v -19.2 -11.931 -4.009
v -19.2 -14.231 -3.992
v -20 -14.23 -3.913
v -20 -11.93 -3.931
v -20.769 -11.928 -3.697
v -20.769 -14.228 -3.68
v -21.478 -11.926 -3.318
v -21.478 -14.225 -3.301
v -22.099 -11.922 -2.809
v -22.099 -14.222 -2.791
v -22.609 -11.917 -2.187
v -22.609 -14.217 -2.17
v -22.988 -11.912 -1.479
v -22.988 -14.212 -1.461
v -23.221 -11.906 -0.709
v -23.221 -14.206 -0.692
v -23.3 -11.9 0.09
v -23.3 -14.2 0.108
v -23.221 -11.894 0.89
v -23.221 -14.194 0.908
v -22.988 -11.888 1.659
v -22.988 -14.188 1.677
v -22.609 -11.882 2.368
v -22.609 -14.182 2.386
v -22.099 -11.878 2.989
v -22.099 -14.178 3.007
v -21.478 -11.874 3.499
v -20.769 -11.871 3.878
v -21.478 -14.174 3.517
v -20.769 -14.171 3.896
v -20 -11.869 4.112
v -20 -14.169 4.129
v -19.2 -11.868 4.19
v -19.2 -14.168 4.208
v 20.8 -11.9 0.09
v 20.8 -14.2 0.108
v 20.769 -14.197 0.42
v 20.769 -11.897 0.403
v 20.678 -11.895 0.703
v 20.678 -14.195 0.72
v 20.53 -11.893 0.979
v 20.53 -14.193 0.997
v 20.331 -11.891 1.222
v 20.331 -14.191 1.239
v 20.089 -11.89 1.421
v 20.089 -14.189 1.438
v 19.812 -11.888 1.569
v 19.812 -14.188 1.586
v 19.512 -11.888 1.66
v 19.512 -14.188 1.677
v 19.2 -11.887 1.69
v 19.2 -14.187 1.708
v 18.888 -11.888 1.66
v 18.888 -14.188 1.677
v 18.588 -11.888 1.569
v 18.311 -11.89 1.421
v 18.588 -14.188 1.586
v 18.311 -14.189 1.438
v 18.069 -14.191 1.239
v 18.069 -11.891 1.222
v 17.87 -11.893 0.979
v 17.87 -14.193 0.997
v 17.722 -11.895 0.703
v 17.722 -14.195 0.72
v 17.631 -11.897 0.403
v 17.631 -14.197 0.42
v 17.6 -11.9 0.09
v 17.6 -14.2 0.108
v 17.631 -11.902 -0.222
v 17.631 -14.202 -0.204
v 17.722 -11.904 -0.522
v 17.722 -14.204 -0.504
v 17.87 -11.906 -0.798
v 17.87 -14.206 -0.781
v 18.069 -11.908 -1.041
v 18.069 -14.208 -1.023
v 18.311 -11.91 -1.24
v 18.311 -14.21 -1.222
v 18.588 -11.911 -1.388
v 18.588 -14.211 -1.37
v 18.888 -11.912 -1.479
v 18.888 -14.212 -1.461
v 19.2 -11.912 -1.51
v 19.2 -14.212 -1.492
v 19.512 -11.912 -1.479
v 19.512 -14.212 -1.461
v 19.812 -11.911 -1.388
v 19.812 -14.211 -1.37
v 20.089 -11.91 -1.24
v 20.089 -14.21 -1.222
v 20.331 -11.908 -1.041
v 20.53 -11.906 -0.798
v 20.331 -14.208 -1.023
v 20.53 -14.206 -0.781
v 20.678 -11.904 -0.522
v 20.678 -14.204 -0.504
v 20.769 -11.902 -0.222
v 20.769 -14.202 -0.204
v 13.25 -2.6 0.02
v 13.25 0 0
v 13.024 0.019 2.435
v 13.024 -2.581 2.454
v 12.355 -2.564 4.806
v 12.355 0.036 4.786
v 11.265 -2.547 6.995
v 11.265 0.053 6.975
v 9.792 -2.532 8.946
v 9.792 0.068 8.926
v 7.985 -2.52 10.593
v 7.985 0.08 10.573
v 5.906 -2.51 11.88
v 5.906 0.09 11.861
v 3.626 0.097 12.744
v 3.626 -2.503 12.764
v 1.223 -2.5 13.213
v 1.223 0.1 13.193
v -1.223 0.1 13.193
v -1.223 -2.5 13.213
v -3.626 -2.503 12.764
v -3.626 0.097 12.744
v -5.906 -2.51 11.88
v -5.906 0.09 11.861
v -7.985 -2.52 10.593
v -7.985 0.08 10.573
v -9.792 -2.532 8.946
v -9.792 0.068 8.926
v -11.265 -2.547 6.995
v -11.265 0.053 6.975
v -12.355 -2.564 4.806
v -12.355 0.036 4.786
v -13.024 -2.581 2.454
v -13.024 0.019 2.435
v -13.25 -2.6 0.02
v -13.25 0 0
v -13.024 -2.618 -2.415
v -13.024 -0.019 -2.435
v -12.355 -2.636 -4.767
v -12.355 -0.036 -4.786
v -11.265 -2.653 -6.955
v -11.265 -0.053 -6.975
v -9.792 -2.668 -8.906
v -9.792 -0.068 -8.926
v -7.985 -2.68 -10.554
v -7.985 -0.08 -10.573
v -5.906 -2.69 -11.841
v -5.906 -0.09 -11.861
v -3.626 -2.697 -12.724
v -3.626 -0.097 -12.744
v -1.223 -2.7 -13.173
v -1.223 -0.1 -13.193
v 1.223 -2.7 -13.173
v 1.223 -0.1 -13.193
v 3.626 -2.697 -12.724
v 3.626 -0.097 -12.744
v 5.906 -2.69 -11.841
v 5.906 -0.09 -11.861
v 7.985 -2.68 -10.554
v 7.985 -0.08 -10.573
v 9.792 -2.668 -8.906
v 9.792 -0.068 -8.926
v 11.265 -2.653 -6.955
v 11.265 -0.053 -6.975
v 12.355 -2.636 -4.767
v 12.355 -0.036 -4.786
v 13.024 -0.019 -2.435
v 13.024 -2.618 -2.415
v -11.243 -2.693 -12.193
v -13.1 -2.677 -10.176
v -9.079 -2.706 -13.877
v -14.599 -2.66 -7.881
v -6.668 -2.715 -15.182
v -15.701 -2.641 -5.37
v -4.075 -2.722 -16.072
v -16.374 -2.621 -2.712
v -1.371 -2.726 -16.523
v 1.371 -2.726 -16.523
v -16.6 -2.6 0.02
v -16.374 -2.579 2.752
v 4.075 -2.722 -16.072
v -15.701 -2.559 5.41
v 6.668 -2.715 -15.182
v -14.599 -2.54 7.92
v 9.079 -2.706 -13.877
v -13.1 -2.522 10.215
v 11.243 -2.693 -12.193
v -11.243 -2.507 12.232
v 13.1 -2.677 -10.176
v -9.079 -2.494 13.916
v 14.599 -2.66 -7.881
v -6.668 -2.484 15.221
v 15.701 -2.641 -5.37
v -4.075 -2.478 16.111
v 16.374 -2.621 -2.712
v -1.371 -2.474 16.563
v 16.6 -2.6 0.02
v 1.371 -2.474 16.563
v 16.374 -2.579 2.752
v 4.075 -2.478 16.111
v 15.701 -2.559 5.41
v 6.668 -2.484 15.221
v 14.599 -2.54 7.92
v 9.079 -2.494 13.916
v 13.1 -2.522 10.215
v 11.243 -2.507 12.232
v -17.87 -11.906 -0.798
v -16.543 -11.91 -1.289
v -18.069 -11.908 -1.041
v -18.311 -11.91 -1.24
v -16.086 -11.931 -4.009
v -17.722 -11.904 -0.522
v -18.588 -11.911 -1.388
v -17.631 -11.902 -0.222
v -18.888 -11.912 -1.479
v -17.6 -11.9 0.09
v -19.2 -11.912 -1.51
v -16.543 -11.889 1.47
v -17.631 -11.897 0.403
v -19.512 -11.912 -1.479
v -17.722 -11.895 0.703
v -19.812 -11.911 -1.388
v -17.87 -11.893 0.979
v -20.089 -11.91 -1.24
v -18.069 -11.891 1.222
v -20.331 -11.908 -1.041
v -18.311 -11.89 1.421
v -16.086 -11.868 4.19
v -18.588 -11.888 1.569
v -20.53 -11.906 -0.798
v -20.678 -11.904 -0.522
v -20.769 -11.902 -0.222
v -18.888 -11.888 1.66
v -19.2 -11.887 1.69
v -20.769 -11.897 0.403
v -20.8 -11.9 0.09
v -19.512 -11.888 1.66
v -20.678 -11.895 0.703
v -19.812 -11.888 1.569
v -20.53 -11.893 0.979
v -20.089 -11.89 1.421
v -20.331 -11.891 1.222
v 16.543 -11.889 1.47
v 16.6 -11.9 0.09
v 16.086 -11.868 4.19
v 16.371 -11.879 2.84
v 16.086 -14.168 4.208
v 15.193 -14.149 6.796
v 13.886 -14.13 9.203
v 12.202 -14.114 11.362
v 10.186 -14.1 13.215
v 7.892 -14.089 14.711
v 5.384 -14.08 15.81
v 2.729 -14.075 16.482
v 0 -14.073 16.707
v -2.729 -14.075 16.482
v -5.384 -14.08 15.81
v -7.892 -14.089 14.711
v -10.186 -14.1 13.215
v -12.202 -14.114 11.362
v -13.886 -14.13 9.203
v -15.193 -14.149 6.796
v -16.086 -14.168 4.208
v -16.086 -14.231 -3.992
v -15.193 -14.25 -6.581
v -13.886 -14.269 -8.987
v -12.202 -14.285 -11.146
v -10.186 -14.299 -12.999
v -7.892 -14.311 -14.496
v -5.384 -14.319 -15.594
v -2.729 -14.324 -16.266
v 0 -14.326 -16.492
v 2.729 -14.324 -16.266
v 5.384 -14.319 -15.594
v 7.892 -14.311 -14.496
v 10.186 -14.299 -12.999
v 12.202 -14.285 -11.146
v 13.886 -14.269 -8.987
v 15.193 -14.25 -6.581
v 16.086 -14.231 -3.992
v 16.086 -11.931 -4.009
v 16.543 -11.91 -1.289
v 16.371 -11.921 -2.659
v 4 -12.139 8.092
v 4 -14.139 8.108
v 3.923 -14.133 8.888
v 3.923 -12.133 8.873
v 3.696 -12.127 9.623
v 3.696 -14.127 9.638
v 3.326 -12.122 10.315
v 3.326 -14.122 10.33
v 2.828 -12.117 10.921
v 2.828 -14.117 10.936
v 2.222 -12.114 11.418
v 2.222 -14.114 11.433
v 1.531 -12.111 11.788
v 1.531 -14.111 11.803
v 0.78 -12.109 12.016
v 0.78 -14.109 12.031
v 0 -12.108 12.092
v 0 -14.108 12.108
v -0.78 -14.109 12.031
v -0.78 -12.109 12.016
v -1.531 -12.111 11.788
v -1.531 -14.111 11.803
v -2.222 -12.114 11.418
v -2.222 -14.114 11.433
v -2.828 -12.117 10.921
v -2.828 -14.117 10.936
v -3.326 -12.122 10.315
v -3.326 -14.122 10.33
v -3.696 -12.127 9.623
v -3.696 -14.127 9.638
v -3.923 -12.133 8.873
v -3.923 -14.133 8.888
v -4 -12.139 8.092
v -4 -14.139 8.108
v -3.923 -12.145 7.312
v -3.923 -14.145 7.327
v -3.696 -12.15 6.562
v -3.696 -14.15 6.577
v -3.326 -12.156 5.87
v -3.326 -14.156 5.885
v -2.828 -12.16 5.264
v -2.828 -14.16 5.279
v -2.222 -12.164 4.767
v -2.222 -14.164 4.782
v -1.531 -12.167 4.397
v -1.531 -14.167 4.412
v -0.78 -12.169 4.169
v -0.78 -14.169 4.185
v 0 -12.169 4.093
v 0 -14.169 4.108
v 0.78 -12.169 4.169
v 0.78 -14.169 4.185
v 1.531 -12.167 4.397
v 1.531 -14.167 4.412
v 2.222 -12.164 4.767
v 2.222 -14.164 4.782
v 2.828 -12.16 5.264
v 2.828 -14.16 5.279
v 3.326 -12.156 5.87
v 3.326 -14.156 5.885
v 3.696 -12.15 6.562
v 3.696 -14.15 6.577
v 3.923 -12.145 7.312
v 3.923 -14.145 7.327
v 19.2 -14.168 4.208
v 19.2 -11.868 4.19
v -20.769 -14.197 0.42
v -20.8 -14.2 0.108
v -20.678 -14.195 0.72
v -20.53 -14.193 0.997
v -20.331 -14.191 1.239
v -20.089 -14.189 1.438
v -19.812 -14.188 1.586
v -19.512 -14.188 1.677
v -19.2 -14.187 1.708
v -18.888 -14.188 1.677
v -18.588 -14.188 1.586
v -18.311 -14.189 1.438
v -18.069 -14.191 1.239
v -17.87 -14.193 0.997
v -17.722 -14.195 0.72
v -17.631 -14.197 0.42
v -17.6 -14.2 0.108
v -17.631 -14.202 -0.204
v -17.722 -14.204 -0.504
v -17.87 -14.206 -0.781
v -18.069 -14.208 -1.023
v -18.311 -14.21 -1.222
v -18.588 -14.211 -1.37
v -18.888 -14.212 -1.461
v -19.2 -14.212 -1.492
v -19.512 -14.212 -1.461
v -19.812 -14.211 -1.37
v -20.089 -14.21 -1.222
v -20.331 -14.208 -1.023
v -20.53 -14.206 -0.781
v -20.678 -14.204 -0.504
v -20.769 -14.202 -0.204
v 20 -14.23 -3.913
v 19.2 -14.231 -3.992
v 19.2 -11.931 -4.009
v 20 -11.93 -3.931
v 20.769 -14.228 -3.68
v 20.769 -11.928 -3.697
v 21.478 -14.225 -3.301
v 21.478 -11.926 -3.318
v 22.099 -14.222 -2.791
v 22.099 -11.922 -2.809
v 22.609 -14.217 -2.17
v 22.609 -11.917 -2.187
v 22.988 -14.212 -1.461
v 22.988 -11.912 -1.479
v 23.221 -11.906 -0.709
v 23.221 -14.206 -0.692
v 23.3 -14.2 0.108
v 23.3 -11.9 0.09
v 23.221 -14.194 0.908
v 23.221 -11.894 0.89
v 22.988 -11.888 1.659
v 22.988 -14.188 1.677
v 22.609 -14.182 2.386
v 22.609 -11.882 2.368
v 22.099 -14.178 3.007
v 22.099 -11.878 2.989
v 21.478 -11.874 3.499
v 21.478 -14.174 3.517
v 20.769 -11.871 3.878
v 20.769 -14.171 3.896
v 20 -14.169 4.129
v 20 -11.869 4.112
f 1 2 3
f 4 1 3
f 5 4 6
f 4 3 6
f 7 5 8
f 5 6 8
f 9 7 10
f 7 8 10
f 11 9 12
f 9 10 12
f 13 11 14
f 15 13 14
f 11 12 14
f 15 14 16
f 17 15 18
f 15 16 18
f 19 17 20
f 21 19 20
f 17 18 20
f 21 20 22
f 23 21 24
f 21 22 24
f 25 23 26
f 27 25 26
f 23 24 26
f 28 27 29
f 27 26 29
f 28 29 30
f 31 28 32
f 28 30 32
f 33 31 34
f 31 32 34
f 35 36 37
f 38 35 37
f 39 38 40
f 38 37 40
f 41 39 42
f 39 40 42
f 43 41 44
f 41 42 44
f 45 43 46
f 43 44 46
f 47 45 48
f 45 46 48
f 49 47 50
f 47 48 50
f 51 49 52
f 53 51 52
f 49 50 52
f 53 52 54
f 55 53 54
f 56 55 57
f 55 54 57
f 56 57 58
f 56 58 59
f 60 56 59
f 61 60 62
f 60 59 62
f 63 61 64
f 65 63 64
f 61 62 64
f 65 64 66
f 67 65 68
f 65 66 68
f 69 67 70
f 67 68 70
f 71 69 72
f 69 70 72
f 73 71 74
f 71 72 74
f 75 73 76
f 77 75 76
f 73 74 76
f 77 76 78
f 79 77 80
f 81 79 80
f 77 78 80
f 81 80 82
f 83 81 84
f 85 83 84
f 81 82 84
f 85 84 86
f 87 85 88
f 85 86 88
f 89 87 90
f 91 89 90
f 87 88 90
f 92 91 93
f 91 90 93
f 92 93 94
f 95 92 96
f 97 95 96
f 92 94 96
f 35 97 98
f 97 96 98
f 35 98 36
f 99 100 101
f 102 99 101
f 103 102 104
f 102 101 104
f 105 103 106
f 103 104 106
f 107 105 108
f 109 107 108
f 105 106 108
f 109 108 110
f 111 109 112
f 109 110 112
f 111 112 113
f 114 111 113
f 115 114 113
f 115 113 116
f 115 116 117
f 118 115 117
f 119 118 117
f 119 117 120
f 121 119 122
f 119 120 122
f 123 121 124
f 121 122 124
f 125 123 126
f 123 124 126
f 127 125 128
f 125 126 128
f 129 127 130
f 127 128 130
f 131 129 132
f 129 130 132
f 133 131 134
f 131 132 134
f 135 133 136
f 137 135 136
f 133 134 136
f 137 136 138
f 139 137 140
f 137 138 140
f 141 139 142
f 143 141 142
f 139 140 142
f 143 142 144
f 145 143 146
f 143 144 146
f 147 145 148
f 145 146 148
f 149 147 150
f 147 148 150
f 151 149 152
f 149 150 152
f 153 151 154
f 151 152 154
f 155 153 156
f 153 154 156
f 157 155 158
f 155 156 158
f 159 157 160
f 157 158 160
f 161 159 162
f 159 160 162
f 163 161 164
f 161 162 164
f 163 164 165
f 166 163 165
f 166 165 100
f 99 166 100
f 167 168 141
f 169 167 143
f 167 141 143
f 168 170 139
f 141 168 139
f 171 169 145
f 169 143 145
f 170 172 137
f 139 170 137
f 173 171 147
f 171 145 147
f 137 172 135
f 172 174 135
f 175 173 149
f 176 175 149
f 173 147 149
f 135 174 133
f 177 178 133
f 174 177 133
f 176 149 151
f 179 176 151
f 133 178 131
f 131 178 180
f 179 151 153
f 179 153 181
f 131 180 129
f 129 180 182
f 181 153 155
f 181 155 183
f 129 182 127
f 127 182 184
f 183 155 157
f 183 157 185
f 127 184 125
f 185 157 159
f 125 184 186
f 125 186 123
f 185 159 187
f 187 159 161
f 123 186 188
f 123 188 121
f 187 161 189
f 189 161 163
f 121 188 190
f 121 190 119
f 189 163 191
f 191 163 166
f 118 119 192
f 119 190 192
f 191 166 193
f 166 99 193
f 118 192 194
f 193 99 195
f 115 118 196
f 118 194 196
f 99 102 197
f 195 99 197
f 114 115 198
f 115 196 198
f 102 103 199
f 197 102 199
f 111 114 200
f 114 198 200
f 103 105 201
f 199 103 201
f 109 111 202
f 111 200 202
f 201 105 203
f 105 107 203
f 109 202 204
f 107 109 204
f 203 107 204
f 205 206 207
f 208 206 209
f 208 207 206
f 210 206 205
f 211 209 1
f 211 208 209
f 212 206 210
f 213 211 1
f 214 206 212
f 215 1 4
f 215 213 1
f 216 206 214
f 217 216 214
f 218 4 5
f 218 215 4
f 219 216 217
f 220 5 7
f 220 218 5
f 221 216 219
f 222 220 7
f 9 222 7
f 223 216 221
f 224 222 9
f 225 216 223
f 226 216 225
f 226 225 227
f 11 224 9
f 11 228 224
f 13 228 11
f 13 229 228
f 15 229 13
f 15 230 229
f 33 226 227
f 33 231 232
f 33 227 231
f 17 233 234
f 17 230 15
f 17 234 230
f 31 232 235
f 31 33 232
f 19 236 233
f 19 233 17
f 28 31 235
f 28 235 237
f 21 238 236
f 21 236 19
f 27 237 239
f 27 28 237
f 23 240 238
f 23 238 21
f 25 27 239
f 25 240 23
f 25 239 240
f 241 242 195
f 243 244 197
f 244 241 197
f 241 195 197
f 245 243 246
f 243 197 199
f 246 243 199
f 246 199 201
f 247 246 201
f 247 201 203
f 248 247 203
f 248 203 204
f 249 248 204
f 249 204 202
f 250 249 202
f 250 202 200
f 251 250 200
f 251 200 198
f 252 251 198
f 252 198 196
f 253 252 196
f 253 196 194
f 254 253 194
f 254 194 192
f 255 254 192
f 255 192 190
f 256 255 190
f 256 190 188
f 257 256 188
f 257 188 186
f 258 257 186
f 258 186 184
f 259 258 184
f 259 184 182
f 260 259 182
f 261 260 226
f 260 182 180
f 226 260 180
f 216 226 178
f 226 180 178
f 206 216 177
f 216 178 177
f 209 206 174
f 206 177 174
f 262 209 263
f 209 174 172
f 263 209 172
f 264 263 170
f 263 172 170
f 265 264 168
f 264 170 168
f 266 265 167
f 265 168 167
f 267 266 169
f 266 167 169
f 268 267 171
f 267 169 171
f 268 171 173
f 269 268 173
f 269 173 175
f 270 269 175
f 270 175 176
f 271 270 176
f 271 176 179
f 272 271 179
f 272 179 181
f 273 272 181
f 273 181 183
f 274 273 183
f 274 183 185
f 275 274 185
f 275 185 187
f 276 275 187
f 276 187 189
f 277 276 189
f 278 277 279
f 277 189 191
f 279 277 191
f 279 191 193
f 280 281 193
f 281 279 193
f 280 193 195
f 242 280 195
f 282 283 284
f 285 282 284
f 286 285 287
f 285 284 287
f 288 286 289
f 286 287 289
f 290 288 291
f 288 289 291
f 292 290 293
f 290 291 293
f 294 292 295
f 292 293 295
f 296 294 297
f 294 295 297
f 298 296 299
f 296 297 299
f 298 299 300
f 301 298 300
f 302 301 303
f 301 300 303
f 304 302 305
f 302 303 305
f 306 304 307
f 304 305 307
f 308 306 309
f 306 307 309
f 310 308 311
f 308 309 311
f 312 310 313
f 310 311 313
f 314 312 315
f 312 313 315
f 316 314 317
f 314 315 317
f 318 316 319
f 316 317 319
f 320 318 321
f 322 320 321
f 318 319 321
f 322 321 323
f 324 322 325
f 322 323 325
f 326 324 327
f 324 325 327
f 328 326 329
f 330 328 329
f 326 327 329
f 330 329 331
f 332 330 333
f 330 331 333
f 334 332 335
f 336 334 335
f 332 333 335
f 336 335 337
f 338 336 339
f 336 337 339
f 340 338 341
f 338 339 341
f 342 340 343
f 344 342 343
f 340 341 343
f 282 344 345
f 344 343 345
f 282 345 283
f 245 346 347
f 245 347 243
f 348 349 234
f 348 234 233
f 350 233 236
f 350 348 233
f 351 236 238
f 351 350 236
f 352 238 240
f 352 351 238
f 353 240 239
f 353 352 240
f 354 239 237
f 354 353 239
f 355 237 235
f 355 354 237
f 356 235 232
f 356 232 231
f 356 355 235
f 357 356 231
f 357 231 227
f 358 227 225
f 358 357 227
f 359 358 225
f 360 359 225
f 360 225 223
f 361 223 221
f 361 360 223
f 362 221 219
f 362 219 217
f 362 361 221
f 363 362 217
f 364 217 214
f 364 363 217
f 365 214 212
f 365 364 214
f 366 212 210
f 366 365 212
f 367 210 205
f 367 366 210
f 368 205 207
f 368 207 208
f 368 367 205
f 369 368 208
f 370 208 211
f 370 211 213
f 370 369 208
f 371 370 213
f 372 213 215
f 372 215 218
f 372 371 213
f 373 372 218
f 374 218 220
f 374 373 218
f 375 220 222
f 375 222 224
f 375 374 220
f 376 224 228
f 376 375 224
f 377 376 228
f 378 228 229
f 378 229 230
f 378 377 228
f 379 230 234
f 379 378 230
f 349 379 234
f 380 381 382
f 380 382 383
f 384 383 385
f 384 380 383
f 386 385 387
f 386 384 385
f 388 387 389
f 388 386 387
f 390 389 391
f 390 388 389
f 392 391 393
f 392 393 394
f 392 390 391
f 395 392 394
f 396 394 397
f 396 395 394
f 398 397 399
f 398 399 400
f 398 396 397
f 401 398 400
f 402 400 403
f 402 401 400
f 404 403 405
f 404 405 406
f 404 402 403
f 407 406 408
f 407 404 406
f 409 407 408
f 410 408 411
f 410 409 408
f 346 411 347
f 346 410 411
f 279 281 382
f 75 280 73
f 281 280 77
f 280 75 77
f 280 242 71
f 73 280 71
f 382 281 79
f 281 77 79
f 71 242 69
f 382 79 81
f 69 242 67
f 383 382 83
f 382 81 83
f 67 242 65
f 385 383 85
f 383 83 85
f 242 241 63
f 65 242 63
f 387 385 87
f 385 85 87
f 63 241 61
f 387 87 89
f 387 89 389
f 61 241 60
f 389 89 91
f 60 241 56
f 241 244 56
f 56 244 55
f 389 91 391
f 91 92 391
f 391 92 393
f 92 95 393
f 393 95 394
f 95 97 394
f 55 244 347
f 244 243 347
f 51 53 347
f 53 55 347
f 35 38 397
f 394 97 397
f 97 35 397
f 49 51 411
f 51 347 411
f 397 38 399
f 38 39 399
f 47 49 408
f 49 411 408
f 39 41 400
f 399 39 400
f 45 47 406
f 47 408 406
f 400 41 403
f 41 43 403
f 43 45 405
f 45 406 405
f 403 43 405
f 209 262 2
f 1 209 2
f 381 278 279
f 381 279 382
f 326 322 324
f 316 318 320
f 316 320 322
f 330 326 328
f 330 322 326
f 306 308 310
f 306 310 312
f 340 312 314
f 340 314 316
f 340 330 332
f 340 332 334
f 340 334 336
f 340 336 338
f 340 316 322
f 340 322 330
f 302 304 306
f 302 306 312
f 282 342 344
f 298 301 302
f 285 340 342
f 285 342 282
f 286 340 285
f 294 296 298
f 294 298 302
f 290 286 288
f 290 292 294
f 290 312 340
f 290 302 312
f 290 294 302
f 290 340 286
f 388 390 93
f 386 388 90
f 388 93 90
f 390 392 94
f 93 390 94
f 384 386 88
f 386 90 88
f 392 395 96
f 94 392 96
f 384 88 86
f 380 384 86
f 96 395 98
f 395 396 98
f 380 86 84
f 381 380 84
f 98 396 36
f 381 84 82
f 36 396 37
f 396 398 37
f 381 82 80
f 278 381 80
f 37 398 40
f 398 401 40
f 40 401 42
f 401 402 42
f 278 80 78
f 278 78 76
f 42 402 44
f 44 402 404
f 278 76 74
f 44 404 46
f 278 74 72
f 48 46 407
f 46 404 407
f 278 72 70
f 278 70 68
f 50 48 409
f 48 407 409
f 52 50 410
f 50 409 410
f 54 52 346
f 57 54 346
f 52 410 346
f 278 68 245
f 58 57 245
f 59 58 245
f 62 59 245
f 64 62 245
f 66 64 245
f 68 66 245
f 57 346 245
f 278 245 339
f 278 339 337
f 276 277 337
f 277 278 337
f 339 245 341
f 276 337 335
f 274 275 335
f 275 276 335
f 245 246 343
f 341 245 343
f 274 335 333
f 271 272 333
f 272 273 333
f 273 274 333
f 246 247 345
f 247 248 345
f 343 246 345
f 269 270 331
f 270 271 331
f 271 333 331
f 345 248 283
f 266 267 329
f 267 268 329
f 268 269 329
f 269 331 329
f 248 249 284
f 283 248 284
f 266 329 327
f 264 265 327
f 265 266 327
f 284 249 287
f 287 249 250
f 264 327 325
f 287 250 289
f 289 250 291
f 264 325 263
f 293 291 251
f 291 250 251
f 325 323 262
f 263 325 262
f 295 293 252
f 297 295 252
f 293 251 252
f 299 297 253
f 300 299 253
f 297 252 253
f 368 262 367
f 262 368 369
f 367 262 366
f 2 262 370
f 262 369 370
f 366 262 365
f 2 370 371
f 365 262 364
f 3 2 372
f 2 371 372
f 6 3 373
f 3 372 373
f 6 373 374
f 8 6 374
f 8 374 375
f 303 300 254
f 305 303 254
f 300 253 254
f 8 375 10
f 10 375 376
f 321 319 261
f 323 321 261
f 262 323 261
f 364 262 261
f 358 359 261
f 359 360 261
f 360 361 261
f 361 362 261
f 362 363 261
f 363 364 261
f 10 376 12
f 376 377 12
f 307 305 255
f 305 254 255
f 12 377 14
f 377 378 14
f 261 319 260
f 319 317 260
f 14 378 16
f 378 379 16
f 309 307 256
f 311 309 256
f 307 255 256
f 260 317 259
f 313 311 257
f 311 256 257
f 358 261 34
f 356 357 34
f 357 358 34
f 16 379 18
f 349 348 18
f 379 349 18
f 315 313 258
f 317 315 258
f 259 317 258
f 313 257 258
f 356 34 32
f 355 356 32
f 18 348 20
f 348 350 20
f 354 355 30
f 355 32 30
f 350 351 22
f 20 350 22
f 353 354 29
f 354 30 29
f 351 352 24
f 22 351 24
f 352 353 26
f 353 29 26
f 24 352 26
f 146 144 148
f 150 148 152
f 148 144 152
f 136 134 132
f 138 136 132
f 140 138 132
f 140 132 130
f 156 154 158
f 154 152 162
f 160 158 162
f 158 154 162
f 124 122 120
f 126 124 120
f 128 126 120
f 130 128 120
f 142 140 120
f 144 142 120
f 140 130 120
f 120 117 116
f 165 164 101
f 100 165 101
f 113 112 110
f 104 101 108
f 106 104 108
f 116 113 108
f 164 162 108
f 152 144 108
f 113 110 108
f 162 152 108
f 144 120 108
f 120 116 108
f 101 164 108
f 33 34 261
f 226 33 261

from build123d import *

# Parameters (mm, degrees)
SKETCH002_R        = 16.6
PAD001_DEPTH       = 14.2
SKETCH003_R        = 16.6
SKETCH003_R_2      = 13.25
POCKET001_DEPTH    = 2.6
SKETCH009_R        = 4
POCKET004_DEPTH    = 2
SKETCH005_R        = 1.6
PAD005_DEPTH       = 2.3
BODY001_ROLL_ANGLE = -0.43547


with BuildPart() as part:
    # Sketch002 → Pad001 (new body)
    with BuildSketch(Plane.XZ):
        Circle(SKETCH002_R)
    extrude(amount=PAD001_DEPTH)

    # Sketch003 → Pocket001 (cut)
    with BuildSketch(Plane.XZ):
        Circle(SKETCH003_R)
        Circle(SKETCH003_R_2, mode=Mode.SUBTRACT)
    extrude(amount=POCKET001_DEPTH, mode=Mode.SUBTRACT)

    # Sketch009 (on Face3 of Pocket001) → Pocket004 (cut)
    with BuildSketch(Plane.XZ.offset(14.2)):
        with Locations((0, 8)):
            Circle(SKETCH009_R)
    extrude(amount=-POCKET004_DEPTH, mode=Mode.SUBTRACT)

    # Sketch005 (on Face3 of Pocket001) → Pad005 (join)
    with BuildSketch(Plane.XZ.offset(14.2)):
        with BuildLine():
            ThreePointArc((19.2, -4.1), (23.300001, 0), (19.2, 4.1))
            Line((19.2, 4.1), (9.6, 4.1))
            Line((9.6, 4.1), (9.6, -4.1))
            Line((9.6, -4.1), (19.2, -4.1))
        make_face()
        with Locations((19.200001, 0)):
            Circle(SKETCH005_R, mode=Mode.SUBTRACT)
    pad005 = extrude(amount=-PAD005_DEPTH)

    # Mirrored: Pad005 across Sketch005 V_Axis
    add(pad005.mirror(Plane(origin=(0, -14.2, 0), x_dir=(0, -1, 0), z_dir=(1, 0, 0))))


with BuildPart() as part_1:
    # Body001 roll: moved
    add(part.part.rotate(Axis((0, 0, 0), (1, 0, 0)), BODY001_ROLL_ANGLE))


with BuildPart() as part_2:
    # Body001 placement: moved
    add(part_1.part.moved(Location((0, 0, 0))))


solid = part_2.part
